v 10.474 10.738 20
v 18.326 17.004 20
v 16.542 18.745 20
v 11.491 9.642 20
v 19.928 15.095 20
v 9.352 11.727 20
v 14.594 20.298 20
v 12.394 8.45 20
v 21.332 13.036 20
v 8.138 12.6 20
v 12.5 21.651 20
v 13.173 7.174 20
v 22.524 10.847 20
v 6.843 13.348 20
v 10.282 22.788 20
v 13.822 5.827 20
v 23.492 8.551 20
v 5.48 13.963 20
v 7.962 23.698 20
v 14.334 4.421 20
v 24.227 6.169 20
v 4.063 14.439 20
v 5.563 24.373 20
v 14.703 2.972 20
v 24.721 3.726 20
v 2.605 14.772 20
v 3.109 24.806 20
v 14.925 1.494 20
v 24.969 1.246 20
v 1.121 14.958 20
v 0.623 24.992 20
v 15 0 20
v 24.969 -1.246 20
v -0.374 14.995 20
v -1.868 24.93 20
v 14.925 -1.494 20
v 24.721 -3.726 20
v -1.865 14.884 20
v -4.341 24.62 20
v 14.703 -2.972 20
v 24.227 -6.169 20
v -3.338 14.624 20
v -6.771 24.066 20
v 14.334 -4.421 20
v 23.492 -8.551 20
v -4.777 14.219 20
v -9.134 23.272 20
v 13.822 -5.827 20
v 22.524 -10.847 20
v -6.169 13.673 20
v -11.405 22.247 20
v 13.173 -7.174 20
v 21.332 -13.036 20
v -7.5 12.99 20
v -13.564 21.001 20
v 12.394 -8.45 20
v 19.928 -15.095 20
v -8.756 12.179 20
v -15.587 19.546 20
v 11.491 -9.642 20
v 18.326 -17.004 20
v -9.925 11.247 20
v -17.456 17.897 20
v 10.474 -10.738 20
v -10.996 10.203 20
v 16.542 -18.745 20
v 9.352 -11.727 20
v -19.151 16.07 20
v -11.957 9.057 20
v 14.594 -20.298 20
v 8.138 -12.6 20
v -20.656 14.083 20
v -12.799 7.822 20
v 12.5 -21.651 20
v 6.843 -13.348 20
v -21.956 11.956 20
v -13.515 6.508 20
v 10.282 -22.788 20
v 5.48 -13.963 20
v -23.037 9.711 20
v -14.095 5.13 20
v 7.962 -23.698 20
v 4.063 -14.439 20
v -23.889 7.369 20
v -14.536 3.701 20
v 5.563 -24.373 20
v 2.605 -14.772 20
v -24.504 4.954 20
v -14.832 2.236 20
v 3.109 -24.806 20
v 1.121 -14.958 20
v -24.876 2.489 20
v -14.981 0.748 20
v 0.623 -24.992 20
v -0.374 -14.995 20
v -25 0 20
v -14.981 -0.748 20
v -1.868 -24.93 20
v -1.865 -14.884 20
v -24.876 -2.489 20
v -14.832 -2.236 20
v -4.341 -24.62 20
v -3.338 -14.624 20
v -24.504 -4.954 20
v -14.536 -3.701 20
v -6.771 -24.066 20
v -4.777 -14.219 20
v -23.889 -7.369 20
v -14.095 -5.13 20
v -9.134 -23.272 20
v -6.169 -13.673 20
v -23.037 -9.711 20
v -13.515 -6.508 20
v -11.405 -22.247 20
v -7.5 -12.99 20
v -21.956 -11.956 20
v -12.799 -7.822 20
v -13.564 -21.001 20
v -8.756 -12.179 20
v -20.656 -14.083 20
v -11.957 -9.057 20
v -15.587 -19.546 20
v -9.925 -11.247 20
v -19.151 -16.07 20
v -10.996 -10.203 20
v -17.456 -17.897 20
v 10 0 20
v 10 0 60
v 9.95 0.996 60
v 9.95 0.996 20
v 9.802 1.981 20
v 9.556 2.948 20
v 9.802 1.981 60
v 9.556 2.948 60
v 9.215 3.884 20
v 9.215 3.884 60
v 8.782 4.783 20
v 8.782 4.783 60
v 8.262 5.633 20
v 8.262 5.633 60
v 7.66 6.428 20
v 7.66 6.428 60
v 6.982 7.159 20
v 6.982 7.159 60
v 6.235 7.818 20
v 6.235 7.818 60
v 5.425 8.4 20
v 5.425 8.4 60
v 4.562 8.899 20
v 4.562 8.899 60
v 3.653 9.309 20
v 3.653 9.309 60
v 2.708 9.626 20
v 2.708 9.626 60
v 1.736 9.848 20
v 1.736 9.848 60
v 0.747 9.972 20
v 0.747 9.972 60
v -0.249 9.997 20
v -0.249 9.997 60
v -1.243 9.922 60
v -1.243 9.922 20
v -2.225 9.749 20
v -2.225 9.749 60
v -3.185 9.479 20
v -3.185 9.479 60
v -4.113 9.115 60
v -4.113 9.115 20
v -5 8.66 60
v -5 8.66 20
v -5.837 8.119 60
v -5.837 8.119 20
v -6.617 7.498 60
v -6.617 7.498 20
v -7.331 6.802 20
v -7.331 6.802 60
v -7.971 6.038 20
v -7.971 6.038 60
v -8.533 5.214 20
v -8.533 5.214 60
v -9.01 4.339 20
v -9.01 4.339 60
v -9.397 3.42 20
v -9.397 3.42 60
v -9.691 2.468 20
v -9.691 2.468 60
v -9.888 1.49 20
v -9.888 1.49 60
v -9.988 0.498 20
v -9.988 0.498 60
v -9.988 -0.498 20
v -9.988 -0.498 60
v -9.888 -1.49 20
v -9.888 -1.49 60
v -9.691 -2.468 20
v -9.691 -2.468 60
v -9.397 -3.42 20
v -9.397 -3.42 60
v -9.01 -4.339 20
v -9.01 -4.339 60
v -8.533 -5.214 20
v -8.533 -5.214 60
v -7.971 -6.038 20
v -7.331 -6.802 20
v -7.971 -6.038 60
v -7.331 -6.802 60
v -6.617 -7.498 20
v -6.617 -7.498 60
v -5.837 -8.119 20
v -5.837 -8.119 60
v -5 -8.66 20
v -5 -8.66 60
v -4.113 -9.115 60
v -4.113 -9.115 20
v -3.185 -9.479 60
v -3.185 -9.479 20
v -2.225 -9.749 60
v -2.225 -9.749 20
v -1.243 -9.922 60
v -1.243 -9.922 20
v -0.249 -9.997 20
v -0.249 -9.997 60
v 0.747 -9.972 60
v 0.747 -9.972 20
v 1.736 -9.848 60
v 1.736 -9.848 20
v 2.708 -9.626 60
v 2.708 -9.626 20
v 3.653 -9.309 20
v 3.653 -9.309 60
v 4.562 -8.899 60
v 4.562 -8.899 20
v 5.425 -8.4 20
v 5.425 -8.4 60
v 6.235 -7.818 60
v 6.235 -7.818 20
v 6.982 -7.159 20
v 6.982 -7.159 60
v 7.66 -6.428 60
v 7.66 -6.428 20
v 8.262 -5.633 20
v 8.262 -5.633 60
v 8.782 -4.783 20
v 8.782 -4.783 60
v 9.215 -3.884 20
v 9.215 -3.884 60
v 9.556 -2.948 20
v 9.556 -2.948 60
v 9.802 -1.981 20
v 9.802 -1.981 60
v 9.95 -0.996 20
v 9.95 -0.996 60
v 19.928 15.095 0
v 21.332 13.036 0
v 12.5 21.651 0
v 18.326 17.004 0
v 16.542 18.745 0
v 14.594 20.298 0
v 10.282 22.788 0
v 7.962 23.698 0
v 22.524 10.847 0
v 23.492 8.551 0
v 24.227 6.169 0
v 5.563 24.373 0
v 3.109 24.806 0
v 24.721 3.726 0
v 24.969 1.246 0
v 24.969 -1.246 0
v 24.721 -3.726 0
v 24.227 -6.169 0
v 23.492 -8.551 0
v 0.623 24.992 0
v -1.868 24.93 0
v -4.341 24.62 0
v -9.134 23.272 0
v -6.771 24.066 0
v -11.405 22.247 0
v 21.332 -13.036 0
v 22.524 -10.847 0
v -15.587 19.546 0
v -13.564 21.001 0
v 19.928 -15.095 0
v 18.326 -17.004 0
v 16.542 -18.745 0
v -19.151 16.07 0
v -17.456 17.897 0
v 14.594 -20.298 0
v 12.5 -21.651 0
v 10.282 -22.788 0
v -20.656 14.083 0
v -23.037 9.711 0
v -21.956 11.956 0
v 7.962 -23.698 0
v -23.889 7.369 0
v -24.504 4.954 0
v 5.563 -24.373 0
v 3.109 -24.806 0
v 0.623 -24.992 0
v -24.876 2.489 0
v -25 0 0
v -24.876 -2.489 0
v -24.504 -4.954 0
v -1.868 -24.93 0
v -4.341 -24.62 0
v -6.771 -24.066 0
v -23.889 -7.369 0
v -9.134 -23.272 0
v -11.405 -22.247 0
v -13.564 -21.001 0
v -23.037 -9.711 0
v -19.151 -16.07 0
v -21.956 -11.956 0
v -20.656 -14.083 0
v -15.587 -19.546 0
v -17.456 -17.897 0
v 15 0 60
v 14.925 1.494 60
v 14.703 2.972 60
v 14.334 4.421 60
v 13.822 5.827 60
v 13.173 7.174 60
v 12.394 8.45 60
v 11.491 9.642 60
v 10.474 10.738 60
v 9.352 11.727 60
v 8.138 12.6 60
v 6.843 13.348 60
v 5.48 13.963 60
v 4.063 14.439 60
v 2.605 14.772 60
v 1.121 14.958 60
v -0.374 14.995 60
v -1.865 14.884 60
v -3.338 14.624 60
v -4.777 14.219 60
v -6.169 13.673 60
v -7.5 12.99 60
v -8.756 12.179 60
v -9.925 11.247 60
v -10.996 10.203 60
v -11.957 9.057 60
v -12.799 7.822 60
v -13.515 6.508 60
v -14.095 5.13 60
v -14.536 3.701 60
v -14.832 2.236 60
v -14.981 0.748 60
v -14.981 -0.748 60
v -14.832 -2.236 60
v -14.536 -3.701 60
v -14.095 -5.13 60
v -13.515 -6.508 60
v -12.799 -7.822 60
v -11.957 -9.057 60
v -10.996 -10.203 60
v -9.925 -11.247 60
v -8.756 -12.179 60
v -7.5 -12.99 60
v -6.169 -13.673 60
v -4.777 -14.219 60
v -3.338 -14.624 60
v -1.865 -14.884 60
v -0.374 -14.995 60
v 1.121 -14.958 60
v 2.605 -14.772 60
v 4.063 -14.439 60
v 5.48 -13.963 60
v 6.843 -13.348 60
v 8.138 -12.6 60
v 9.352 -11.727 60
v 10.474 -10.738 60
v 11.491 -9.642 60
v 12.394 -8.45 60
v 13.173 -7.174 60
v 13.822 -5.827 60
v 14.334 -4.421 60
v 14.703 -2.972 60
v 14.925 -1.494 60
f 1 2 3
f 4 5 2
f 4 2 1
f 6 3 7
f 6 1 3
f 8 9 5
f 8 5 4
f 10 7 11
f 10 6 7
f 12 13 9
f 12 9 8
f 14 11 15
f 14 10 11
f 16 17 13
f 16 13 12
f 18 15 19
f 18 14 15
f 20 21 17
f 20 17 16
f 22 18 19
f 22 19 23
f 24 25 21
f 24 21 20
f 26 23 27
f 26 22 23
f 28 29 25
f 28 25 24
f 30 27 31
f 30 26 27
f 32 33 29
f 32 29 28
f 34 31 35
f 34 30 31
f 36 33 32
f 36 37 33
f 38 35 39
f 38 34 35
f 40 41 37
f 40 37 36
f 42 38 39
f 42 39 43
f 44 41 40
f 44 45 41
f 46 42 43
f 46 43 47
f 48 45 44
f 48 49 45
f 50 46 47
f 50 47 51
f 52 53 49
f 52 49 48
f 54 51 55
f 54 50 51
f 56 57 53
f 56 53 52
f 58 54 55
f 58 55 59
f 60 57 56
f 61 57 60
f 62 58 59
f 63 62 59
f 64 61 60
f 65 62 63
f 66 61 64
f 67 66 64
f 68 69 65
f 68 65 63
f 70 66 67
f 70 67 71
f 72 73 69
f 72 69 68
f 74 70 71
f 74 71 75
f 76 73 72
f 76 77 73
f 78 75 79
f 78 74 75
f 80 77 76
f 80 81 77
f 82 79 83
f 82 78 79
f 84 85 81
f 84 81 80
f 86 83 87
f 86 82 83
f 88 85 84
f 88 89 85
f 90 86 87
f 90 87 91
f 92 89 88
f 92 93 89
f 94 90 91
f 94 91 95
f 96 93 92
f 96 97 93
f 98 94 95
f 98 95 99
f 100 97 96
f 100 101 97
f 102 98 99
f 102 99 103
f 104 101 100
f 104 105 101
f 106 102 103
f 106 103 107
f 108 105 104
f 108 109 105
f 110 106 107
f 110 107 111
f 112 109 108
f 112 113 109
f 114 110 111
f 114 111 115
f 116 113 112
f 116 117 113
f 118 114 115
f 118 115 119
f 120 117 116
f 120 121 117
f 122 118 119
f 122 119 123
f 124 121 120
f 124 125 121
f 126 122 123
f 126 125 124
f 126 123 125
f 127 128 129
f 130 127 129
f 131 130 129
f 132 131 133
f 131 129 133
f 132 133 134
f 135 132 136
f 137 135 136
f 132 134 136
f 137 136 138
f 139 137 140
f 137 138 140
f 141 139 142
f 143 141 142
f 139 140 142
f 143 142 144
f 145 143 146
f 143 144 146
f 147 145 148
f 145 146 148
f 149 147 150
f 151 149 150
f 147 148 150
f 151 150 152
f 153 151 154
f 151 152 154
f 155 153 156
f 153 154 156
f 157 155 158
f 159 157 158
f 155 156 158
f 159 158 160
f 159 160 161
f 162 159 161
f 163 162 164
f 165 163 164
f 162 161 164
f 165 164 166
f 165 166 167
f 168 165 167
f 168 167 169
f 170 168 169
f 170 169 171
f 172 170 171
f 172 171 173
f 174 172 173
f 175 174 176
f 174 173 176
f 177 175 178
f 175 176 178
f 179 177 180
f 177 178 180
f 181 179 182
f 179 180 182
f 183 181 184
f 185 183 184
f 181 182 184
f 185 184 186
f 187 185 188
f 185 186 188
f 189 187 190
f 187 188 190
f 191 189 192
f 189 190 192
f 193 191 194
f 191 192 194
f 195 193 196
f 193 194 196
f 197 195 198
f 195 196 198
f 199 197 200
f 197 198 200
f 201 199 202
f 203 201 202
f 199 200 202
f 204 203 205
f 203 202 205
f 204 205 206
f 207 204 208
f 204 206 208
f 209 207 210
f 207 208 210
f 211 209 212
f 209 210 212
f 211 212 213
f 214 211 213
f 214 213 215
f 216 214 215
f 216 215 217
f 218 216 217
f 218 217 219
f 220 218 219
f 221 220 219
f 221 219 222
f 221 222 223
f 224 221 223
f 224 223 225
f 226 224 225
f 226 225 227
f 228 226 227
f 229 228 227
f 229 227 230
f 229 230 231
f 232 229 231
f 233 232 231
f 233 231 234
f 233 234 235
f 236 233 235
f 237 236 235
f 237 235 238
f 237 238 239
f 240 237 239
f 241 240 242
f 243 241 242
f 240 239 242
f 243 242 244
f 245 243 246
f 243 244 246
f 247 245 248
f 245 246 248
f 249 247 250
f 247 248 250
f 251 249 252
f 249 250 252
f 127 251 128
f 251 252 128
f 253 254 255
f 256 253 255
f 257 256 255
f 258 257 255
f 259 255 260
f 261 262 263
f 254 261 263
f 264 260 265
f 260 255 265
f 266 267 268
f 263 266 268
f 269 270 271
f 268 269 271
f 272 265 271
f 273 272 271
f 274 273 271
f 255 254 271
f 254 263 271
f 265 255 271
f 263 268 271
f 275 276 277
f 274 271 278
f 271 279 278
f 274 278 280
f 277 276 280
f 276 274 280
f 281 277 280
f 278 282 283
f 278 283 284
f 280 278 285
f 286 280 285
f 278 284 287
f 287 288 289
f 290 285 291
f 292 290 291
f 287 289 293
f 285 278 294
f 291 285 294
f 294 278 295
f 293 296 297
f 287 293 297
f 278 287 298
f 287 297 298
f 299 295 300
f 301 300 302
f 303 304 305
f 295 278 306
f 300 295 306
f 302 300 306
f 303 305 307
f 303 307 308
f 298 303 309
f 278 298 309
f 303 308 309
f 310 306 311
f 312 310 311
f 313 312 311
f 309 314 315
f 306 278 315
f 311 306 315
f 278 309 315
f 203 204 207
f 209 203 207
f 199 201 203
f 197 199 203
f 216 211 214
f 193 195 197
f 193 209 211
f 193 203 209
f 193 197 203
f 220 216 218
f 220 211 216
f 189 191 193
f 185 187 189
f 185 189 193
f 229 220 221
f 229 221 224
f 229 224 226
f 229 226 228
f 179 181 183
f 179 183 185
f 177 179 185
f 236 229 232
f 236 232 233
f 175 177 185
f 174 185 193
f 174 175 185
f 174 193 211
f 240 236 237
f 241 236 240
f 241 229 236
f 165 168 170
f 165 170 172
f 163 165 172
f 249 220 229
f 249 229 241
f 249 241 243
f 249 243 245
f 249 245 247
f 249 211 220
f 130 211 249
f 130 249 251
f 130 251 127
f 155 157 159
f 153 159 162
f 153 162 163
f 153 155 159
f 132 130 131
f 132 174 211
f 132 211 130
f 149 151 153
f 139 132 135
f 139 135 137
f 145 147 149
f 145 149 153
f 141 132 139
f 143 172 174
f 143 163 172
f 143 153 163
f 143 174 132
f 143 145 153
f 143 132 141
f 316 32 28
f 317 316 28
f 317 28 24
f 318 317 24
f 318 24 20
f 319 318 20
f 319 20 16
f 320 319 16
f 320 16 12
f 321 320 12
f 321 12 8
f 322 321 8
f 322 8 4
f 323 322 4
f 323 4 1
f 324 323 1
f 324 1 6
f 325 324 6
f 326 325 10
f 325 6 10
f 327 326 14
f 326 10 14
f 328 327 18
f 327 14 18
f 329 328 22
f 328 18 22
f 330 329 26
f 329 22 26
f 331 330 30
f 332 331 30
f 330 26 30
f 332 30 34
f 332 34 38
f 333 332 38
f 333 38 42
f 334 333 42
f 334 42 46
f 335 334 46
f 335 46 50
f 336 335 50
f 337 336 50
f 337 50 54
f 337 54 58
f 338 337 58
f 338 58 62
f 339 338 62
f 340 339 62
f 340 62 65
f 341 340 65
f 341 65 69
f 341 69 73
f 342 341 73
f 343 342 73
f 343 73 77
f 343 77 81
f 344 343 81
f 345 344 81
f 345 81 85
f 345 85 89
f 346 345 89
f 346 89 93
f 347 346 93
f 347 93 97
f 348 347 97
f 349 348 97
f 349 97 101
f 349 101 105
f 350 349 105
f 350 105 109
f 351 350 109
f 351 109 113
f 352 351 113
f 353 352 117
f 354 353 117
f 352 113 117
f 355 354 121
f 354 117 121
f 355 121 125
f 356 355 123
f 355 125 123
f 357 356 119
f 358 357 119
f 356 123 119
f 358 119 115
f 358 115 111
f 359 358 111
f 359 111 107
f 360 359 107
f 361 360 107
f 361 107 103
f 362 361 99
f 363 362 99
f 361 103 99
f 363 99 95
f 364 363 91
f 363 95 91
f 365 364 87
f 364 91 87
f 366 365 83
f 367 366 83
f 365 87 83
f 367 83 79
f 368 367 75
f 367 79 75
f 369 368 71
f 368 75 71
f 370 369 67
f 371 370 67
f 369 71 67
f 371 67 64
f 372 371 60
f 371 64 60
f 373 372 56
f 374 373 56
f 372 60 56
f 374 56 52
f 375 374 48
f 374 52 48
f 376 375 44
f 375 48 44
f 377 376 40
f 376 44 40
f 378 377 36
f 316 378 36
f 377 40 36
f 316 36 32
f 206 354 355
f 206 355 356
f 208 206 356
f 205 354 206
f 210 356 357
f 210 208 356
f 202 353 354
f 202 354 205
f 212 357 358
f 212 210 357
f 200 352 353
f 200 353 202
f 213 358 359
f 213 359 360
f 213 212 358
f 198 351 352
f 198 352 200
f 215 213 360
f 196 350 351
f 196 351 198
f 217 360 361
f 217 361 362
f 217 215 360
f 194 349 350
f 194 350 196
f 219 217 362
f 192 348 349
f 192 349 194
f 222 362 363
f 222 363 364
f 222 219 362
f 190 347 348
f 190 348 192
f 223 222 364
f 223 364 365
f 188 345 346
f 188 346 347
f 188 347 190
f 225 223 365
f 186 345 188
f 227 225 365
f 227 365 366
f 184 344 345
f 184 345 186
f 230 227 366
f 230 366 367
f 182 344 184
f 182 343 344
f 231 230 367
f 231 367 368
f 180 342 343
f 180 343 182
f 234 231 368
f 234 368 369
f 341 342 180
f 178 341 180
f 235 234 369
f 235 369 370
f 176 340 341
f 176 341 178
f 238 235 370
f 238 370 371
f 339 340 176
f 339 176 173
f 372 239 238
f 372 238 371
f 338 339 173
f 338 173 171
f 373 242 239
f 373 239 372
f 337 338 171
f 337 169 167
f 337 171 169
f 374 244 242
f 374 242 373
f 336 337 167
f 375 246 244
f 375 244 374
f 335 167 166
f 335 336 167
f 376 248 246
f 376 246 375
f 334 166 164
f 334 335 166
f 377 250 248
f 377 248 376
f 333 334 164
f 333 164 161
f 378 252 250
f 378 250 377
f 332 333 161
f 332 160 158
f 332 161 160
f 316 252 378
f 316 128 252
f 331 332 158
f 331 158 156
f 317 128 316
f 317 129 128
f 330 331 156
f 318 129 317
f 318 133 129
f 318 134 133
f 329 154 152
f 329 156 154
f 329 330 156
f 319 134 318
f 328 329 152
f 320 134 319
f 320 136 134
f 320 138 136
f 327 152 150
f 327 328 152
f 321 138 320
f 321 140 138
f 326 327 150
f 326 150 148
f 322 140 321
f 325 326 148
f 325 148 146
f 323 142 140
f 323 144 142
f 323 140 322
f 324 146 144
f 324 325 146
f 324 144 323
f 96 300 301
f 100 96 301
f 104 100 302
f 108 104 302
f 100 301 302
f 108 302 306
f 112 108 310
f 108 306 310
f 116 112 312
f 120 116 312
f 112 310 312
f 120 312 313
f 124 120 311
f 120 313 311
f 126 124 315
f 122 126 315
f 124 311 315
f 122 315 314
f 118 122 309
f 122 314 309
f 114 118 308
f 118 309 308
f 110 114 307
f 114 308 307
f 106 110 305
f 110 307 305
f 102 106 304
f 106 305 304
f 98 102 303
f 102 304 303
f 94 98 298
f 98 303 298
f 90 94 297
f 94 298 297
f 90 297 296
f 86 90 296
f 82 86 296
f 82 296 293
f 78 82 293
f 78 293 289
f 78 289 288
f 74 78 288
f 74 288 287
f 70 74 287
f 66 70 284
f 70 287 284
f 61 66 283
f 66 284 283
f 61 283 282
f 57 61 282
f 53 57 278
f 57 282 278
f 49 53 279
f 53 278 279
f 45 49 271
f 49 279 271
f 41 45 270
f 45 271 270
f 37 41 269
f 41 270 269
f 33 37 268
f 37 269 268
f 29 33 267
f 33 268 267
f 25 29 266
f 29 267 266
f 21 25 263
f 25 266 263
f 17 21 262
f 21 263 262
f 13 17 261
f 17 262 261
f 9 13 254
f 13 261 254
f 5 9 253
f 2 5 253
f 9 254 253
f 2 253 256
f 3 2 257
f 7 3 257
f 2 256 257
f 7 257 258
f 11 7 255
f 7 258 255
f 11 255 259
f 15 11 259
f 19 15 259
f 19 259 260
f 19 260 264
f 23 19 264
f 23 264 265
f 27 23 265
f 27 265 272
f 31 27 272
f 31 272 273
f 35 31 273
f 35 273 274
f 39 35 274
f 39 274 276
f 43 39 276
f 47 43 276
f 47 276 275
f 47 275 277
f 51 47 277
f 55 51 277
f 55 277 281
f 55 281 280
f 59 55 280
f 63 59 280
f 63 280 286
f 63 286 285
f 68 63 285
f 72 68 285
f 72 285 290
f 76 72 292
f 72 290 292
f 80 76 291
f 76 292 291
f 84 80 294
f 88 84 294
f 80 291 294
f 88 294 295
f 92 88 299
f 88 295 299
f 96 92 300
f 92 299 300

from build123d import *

# Parameters (mm, degrees)
CROQUIS1_R                   = 25
SALIENTE_EXTRUIR1_DEPTH      = 20
SALIENTE_EXTRUIR2_DEPTH      = 40
SALIENTE_EXTRUIR2_DEPTH_BACK = 1
CROQUIS2_R                   = 15
CROQUIS3_R                   = 10
CORTAR_EXTRUIR1_DEPTH        = 40


with BuildPart() as part:
    # Croquis1 → Saliente-Extruir1 (new body)
    with BuildSketch(Plane.XY):
        with Locations(Location((0, 0, 0), (0, 0, 180))):
            Circle(CROQUIS1_R)
    extrude(amount=SALIENTE_EXTRUIR1_DEPTH)

    # Croquis2 → Saliente-Extruir2 (add, two sides: drawn at the far end of the back side and taken through both)
    with BuildSketch(Plane.XY.offset(20).offset(-SALIENTE_EXTRUIR2_DEPTH_BACK)):
        Circle(CROQUIS2_R)
    extrude(amount=SALIENTE_EXTRUIR2_DEPTH + SALIENTE_EXTRUIR2_DEPTH_BACK)

    # Croquis3 → Cortar-Extruir1 (cut)
    with BuildSketch(Plane.XY.offset(60)):
        Circle(CROQUIS3_R)
    extrude(amount=-CORTAR_EXTRUIR1_DEPTH, mode=Mode.SUBTRACT)


solid = part.part
